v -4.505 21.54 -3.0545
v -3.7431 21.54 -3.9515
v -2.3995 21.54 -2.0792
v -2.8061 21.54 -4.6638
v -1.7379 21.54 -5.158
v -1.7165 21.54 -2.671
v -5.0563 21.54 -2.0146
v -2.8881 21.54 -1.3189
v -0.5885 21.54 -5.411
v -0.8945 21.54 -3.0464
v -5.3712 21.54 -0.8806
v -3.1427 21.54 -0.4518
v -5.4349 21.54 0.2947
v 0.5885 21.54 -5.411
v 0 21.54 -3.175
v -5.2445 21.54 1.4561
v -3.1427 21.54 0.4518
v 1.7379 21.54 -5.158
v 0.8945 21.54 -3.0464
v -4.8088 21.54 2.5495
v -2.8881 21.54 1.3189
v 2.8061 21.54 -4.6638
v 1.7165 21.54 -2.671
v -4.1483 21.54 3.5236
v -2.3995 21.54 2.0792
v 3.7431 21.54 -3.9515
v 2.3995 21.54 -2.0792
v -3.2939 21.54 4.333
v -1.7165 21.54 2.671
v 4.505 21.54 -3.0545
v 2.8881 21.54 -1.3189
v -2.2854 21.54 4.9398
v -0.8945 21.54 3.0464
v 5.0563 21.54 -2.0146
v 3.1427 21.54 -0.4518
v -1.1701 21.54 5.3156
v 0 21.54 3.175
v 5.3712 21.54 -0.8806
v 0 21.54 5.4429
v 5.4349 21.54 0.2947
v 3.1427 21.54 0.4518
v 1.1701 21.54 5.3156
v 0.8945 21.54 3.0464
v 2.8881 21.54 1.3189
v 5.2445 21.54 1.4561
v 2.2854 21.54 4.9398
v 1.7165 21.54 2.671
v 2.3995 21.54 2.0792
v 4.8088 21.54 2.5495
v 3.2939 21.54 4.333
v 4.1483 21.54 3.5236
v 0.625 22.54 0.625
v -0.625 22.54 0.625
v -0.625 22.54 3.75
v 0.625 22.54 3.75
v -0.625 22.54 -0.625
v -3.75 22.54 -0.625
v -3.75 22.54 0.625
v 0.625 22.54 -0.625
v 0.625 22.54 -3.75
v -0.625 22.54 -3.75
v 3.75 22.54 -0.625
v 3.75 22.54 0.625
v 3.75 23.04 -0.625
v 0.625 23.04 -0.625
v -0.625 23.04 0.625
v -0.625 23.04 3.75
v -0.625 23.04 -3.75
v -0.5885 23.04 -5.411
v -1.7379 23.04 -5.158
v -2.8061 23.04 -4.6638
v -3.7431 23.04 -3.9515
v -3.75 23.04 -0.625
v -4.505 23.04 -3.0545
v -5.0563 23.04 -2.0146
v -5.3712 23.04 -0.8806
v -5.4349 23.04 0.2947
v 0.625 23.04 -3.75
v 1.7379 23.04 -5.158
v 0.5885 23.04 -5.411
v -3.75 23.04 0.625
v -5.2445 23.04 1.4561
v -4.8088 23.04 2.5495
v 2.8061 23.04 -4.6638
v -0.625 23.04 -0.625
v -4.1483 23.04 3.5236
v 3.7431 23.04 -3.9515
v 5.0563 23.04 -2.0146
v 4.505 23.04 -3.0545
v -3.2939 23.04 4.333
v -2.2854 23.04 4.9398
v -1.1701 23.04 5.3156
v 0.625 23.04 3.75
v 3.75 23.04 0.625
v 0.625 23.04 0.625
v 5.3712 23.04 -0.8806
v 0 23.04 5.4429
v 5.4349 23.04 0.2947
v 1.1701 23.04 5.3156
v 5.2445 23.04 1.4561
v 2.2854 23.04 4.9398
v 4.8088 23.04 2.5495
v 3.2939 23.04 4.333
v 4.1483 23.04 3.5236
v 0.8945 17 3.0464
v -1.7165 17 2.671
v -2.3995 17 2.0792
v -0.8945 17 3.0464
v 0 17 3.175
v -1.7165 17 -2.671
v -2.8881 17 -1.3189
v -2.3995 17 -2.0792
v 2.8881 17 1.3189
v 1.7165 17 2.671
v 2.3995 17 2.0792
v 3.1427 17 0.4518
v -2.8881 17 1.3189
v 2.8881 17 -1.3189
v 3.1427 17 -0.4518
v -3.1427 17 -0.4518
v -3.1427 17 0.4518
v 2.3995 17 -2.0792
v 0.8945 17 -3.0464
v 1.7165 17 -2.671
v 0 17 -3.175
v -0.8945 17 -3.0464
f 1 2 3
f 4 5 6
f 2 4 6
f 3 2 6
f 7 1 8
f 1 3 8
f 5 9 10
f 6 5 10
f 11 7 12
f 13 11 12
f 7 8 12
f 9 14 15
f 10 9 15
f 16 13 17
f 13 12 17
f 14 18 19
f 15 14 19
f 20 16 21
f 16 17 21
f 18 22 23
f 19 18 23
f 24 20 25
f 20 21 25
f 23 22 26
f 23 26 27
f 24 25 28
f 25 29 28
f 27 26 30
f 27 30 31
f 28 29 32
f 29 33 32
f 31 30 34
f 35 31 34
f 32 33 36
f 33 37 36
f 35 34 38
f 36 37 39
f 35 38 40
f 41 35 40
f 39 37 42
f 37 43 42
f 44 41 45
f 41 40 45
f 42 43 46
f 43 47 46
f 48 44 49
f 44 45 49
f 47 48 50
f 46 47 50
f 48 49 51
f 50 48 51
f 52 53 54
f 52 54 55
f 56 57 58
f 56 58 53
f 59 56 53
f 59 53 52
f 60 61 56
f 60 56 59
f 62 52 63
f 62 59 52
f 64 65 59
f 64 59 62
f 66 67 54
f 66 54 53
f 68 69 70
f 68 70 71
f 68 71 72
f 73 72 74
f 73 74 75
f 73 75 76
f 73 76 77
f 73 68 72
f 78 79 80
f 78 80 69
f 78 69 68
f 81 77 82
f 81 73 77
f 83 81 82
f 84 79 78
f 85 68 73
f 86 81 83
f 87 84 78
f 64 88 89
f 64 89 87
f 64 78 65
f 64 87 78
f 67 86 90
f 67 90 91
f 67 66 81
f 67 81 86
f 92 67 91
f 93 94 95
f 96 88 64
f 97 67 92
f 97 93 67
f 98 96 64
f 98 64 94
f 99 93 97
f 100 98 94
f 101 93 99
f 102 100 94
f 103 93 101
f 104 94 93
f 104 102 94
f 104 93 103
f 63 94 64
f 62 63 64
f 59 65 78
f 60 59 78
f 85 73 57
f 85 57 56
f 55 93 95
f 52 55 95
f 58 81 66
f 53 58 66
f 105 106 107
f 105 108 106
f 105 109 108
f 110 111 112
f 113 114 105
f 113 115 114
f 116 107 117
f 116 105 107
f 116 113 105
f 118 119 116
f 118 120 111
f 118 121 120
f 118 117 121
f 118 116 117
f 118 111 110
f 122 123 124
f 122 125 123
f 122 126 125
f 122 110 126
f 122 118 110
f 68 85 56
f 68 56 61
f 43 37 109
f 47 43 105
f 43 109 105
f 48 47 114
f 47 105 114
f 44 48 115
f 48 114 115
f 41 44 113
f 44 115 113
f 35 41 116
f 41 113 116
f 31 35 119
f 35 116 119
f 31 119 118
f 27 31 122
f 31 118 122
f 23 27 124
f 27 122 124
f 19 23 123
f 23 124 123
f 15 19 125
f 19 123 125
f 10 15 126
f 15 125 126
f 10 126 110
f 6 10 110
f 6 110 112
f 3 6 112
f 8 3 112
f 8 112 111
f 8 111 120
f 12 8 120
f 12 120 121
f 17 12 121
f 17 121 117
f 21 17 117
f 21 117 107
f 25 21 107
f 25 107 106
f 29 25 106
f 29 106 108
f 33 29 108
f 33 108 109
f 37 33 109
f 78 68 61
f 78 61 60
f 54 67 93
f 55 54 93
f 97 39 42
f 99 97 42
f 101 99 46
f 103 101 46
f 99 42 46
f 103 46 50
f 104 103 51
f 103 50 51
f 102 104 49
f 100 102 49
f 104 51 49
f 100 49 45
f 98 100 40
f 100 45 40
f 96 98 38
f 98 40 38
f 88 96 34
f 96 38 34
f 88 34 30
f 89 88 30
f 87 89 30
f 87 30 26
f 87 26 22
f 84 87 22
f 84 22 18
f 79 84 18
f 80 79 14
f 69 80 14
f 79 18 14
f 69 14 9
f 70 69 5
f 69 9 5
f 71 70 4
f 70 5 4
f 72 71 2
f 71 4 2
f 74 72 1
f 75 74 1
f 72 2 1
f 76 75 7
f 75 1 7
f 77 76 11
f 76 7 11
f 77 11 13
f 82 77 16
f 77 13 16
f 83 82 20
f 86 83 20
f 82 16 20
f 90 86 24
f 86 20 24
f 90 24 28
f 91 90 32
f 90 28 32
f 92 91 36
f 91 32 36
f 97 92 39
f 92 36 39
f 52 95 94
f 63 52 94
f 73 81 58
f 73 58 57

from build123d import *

# Parameters (mm, degrees)
SKETCH1_R           = 3.175
BOSS_EXTRUDE1_DEPTH = 21.54
SKETCH2_R           = 5.442868
BOSS_EXTRUDE2_DEPTH = 1.5
SKETCH3_W           = 1.25
SKETCH3_H           = 3.125
SKETCH3_W_2         = 3.125
SKETCH3_H_2         = 1.25
CUT_EXTRUDE2_DEPTH  = 0.5
SKETCH4_R           = 3.175
CUT_EXTRUDE3_DEPTH  = 17


with BuildPart() as part:
    # Sketch1 → Boss-Extrude1 (new body)
    with BuildSketch(Plane(origin=(0, 0, 0), x_dir=(1, 0, 0), z_dir=(0, 1, 0))):
        with Locations(Location((0, 0, 0), (0, 0, 270))):
            Circle(SKETCH1_R)
    extrude(amount=BOSS_EXTRUDE1_DEPTH)

    # Sketch2 → Boss-Extrude2 (add)
    with BuildSketch(Plane(origin=(0, 21.54, 0), x_dir=(1, 0, 0), z_dir=(0, 1, 0))):
        with Locations(Location((0, 0, 0), (0, 0, 270))):
            Circle(SKETCH2_R)
    extrude(amount=BOSS_EXTRUDE2_DEPTH)

    # Sketch3 → Cut-Extrude2 (cut)
    with BuildSketch(Plane(origin=(0, 23.04, 0), x_dir=(1, 0, 0), z_dir=(0, 1, 0))):
        with Locations((0, -2.1875)):
            Rectangle(SKETCH3_W, SKETCH3_H)
        with Locations((-2.1875, 0)):
            Rectangle(SKETCH3_W_2, SKETCH3_H_2)
        with Locations((0, 2.1875)):
            Rectangle(SKETCH3_W, SKETCH3_H)
        with Locations((2.1875, 0)):
            Rectangle(SKETCH3_W_2, SKETCH3_H_2)
        Rectangle(SKETCH3_W, SKETCH3_H_2)
    extrude(amount=-CUT_EXTRUDE2_DEPTH, mode=Mode.SUBTRACT)

    # Sketch4 → Cut-Extrude3 (cut)
    with BuildSketch(Plane.XZ):
        with Locations(Location((0, 0, 0), (0, 0, 270))):
            Circle(SKETCH4_R)
    extrude(amount=-CUT_EXTRUDE3_DEPTH, mode=Mode.SUBTRACT)


solid = part.part
